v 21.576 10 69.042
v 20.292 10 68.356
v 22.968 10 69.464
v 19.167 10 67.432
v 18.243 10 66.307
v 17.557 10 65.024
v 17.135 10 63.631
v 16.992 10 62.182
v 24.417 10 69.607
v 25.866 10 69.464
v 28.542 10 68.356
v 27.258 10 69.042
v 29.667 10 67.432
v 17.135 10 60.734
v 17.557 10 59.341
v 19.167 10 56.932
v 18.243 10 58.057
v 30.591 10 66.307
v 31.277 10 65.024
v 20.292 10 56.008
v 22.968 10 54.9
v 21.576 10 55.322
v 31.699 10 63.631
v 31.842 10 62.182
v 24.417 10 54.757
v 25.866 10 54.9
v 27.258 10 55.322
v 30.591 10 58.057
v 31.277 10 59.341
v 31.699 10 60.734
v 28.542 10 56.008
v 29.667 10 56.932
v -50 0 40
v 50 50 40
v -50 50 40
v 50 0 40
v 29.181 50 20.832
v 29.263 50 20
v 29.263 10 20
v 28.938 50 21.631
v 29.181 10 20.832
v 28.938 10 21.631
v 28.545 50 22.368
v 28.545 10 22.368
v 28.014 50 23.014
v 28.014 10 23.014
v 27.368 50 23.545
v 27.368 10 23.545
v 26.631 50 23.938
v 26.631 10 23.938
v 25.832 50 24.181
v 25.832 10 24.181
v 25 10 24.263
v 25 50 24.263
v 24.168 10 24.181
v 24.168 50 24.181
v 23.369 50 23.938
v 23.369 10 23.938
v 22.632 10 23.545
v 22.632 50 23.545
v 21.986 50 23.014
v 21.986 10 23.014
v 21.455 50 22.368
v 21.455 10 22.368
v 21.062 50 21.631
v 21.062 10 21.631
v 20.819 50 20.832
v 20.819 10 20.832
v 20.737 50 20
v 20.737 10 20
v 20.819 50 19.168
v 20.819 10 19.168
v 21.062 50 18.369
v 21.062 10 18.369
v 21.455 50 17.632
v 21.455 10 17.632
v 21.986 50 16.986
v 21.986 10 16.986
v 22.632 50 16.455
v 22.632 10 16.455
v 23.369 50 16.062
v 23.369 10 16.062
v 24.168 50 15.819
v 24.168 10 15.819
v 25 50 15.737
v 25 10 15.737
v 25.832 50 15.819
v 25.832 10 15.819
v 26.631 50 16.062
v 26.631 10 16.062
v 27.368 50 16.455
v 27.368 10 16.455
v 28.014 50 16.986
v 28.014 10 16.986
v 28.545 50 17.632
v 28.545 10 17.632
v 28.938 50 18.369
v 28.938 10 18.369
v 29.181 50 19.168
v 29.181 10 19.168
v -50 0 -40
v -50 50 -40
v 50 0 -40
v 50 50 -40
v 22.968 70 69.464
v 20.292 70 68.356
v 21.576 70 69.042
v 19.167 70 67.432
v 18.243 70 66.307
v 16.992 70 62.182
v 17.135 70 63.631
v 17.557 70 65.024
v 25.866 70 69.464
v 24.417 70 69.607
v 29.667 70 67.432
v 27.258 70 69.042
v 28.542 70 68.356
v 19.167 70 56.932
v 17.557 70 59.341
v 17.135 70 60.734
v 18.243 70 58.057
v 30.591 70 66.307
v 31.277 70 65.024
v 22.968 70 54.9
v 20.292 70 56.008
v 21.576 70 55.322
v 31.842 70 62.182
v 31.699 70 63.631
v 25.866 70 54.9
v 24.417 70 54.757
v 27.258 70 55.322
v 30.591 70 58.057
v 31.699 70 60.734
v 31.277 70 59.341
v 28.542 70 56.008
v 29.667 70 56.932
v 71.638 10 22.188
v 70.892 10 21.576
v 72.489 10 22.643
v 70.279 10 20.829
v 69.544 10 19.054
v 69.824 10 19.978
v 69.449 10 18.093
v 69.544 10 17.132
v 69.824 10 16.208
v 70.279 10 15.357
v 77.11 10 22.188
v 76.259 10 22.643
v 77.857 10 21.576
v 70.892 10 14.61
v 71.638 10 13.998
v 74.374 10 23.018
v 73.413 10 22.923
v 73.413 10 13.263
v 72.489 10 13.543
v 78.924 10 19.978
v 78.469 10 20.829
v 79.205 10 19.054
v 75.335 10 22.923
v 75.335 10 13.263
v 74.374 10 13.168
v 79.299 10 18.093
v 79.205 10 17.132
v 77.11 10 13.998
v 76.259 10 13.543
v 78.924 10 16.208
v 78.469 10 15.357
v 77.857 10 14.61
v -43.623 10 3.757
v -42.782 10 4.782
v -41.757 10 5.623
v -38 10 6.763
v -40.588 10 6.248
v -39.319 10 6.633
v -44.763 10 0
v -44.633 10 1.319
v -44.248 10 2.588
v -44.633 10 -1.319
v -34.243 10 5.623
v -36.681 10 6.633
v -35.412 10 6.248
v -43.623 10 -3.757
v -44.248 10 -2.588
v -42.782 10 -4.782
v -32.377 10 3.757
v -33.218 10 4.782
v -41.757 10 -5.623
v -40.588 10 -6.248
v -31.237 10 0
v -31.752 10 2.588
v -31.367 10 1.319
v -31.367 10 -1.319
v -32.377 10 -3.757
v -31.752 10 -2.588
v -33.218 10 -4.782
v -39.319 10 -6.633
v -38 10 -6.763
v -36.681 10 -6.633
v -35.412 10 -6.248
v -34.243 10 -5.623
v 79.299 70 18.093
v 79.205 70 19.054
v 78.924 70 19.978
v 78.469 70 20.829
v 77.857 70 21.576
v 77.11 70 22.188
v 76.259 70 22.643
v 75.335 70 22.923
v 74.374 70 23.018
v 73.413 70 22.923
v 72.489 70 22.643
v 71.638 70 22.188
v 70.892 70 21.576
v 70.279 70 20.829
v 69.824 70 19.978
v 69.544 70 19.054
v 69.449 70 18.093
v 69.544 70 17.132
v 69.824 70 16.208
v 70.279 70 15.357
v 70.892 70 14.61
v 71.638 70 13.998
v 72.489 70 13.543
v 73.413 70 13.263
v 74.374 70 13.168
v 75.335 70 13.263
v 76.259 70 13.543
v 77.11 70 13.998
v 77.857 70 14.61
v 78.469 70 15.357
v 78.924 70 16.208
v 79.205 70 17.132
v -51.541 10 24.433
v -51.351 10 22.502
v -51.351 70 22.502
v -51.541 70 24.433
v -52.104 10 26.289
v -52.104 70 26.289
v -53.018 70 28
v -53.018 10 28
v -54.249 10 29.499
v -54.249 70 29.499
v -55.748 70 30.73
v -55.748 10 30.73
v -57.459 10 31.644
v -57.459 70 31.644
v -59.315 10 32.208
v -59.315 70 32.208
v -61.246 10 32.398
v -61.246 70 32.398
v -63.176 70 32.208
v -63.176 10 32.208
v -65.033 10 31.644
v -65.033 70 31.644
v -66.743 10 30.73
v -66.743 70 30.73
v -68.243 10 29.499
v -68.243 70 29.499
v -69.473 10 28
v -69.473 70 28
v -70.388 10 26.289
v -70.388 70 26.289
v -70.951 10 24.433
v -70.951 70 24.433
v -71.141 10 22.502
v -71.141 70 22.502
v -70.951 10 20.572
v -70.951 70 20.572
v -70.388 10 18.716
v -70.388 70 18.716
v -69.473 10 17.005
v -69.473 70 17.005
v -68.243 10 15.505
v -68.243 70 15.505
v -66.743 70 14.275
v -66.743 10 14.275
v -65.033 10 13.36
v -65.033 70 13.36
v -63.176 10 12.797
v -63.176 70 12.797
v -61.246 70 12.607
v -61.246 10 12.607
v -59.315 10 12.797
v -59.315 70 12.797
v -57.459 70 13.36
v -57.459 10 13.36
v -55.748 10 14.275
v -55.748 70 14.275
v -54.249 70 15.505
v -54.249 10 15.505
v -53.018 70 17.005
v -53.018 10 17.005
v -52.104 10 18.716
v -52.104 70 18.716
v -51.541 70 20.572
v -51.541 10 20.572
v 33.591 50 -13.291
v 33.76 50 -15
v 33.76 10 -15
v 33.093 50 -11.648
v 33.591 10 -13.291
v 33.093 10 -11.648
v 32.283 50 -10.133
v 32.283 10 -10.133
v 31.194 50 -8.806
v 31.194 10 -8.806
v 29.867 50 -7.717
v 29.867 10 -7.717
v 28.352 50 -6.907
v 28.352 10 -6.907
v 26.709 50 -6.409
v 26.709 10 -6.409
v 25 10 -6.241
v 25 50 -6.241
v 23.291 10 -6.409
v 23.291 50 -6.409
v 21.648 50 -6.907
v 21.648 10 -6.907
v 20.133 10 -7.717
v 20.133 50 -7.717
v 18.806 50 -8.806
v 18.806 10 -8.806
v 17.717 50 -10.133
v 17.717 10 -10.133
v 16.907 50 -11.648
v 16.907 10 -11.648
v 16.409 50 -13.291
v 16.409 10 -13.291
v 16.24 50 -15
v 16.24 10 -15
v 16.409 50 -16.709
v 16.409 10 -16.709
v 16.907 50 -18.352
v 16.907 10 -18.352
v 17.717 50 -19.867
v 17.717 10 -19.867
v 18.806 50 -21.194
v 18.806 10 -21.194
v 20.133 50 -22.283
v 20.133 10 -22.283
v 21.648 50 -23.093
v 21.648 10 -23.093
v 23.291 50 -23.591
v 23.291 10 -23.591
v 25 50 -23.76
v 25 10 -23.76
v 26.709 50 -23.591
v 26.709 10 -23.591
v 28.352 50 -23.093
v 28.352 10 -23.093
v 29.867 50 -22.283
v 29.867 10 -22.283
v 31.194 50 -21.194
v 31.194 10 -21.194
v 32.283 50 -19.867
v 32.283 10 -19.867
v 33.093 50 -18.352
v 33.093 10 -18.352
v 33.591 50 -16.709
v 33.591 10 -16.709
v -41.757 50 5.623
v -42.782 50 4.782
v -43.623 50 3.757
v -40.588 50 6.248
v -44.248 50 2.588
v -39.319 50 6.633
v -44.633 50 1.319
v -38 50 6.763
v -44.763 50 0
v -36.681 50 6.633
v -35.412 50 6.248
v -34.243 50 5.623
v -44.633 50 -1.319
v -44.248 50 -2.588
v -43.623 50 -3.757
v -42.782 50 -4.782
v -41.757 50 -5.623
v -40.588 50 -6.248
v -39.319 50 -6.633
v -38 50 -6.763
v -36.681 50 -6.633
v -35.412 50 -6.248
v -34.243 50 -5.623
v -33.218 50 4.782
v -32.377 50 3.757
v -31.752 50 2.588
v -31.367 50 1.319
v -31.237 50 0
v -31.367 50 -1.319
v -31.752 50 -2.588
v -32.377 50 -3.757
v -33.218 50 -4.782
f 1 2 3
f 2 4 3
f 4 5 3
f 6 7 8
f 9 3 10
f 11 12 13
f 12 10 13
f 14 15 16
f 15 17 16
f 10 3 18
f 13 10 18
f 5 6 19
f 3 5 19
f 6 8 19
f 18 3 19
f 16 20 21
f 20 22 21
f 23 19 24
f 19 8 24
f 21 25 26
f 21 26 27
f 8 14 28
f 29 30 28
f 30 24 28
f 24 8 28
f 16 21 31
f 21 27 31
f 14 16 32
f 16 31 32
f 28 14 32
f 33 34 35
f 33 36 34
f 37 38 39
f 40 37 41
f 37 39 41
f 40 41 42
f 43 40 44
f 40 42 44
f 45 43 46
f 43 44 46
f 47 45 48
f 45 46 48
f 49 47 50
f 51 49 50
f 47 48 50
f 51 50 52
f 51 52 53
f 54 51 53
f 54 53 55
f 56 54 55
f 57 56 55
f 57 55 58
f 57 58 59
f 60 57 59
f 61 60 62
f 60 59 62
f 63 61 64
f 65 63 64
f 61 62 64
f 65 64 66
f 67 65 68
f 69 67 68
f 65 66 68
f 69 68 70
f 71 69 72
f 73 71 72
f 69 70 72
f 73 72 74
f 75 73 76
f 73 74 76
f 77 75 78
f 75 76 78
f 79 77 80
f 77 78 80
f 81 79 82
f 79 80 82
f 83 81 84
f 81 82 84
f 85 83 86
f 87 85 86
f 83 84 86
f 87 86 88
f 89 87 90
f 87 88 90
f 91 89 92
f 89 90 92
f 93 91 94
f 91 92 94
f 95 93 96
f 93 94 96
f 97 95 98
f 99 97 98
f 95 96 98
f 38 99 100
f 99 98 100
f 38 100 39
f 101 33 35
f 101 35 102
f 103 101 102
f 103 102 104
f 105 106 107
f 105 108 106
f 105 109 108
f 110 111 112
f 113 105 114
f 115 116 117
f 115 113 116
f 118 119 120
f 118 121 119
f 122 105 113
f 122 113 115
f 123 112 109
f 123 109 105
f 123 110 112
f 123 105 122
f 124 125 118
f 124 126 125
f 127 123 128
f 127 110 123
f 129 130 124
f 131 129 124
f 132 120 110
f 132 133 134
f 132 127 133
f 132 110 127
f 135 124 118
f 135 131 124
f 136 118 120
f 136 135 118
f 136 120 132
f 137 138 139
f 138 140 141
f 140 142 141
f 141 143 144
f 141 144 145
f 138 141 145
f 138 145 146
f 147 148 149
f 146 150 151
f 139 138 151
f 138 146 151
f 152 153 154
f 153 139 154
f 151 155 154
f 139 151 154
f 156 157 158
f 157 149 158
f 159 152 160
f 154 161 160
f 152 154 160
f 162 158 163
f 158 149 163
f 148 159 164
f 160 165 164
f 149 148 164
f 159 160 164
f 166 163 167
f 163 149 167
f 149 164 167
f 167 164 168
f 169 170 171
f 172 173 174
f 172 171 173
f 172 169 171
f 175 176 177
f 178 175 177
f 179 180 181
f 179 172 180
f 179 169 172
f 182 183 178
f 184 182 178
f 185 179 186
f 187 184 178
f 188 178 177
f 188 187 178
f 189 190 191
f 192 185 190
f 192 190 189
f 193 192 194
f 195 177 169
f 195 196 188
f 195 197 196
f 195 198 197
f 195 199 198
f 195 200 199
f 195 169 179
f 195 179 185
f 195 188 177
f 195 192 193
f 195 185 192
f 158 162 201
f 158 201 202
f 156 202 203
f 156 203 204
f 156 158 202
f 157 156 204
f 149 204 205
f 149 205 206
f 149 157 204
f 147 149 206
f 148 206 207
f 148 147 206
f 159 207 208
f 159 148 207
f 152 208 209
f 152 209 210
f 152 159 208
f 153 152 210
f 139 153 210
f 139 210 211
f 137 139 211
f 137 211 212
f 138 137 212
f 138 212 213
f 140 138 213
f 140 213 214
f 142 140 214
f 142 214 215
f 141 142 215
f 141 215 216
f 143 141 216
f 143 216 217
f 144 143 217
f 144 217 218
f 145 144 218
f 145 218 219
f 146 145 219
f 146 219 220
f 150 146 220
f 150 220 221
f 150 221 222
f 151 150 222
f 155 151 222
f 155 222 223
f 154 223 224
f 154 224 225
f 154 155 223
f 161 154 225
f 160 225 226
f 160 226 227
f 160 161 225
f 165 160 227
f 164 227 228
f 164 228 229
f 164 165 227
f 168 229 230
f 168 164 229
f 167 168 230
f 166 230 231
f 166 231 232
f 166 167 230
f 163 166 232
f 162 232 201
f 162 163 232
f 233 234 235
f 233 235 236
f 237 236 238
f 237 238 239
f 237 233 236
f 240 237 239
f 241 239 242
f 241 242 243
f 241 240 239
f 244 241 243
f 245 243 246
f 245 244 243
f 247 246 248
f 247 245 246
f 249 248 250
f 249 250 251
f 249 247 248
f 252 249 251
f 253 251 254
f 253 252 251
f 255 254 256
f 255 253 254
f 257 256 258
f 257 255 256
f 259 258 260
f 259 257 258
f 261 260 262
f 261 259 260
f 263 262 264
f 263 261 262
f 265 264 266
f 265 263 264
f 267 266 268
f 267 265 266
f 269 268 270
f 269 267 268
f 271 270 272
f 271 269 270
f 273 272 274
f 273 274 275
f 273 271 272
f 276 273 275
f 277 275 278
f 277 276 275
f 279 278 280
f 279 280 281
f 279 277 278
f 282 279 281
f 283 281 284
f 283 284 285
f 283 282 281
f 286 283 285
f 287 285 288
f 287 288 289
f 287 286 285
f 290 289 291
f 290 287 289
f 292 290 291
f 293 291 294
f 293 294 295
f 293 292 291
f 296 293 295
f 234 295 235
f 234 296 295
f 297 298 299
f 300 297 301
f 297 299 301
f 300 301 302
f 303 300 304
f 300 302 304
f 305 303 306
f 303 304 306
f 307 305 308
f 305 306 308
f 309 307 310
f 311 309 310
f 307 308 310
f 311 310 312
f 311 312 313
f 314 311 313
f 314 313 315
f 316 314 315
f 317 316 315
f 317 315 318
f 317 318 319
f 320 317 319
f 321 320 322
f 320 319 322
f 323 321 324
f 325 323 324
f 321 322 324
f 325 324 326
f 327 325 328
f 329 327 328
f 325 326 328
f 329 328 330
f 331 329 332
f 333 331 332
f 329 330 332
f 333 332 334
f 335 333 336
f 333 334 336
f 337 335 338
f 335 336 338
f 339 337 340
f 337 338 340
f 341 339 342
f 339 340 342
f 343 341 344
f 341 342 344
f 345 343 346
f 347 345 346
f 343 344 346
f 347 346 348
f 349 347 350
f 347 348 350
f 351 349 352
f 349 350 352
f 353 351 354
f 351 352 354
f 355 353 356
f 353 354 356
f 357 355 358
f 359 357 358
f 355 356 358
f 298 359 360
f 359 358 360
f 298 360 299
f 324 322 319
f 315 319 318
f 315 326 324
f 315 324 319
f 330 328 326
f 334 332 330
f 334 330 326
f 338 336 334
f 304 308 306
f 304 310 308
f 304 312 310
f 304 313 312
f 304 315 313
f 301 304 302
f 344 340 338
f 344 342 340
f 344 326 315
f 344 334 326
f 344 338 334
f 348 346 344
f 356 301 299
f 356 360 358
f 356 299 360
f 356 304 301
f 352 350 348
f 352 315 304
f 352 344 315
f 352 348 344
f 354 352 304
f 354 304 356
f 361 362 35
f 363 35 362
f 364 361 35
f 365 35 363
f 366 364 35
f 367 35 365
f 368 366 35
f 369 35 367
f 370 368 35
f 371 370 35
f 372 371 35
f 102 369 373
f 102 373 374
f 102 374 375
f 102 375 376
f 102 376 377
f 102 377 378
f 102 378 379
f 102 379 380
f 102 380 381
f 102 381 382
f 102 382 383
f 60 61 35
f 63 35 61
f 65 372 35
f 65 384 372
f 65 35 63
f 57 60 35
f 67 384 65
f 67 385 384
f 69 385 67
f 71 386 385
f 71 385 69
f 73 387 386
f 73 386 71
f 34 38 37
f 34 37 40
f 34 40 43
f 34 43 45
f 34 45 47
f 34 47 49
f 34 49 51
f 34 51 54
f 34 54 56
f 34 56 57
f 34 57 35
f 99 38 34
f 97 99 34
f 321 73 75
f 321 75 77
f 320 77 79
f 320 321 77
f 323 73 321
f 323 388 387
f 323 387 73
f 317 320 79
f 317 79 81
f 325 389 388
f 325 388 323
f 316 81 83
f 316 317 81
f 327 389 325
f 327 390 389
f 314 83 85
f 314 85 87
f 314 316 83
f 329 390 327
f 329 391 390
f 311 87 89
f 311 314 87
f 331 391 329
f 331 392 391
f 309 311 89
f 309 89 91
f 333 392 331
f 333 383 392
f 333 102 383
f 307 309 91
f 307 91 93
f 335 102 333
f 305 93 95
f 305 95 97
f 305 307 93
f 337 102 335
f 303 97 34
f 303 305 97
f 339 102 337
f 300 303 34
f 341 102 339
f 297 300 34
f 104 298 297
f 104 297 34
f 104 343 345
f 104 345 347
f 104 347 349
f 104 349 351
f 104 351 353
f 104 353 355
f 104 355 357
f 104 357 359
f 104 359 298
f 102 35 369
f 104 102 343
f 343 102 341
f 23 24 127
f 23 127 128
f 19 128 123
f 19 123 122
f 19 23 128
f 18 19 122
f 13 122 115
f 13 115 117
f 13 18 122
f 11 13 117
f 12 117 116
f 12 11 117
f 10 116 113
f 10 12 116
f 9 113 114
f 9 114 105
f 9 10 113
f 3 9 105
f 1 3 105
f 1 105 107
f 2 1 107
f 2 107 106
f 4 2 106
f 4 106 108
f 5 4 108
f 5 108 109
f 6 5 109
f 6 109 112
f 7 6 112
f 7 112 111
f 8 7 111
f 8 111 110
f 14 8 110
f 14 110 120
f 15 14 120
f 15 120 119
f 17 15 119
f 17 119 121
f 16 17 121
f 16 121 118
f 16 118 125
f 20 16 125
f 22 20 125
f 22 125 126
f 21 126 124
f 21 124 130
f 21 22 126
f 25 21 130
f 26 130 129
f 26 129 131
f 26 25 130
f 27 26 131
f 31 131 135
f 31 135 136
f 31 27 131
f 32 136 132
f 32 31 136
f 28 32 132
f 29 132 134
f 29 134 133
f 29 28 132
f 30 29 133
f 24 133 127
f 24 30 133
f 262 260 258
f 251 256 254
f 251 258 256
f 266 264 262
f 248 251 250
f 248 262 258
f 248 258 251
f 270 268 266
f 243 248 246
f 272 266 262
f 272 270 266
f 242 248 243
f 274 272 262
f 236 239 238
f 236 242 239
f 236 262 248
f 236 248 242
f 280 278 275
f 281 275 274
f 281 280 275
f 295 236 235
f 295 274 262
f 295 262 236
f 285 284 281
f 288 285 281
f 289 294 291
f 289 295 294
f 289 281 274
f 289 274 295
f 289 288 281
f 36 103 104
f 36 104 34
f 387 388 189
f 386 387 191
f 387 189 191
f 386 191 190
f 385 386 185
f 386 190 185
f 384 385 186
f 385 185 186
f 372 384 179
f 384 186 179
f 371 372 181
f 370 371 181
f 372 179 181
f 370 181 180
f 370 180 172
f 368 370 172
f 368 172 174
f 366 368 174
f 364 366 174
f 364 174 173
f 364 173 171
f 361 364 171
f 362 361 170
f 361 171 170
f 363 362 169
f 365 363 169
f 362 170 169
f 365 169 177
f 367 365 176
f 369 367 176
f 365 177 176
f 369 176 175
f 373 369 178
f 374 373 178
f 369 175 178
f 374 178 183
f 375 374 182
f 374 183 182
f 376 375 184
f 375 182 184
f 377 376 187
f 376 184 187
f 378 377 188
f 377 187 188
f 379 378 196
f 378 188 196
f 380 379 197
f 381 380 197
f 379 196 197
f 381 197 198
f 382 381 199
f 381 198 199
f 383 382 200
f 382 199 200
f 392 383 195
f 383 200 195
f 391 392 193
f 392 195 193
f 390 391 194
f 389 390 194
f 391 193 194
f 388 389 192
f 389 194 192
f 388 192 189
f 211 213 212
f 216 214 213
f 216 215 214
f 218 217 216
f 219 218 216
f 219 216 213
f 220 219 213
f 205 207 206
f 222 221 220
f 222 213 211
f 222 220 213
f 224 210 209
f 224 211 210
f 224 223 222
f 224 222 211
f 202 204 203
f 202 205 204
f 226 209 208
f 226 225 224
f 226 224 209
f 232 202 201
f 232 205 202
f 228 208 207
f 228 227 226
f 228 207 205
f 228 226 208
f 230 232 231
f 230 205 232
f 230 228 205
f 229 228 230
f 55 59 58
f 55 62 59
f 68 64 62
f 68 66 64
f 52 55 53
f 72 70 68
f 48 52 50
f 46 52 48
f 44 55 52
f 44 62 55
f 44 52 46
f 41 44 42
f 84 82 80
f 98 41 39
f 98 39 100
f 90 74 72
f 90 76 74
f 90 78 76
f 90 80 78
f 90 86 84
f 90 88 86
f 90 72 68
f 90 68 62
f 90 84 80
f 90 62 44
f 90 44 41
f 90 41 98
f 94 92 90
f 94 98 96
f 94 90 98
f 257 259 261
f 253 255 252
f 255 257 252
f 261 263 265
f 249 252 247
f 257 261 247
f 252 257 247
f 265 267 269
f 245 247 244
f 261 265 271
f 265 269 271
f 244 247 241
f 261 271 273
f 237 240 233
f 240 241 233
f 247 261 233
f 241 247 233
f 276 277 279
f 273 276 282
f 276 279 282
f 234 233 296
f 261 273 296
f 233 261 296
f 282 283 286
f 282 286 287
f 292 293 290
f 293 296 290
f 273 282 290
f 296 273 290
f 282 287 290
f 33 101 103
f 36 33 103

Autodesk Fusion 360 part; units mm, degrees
sketch "Sketch1" plane through (0, 0, 0) normal (0, 1, 0) x (1, 0, 0)
  line L0 (50, -40) -> (-50, -40)
  line L1 (-50, -40) -> (-50, 40)
  line L2 (-50, 40) -> (50, 40)
  line L3 (50, 40) -> (50, -40)
  line L4 (50, -40) -> (-50, 40) construction
  line L5 (-50, -40) -> (50, 40) construction
  dimension "d1" = 80
  dimension "d2" = 100
extrude "Extrude1" add sketch "Sketch1" along normal blind 50 makes body 1
ref_plane "WorkPlane1" through (0, 10, 0) normal (0, 1, 0) x (0, 0, 1)
sketch "Hole" plane through (0, 10, 0) normal (0, 1, 0) x (1, 0, 0)
  circle A0 centre (25, -20) radius 5
  circle A1 centre (-38, 0) radius 7.5
  circle A2 centre (25, 15) radius 10
  line L0 (-50, 40) -> (50, 40)
  line L1 (50, 40) -> (50, -40)
  line L2 (50, -40) -> (-50, -40)
  line L3 (-50, -40) -> (-50, 40)
  line L4 (50, -40) -> (-50, 40)
  dimension "d6" = 10
  dimension "d7" = 15
  dimension "d8" = 20
  dimension "d30" = 25
  dimension "d31" = 25
  dimension "d32" = 20
  dimension "d33" = 12
extrude "Extrude5" cut sketch "Hole" along normal blind 60 contours A2 bodies 1
extrude "Extrude6" cut sketch "Hole" along normal blind 60 contours A0 L4 | A0 L4 bodies 1
extrude "Extrude7" cut sketch "Hole" along normal blind 60 contours A1 bodies 1
sketch "Rod" plane through (0, 10, 0) normal (0, 1, 0) x (1, 0, 0)
  circle A0 centre (74.3742, -18.093) radius 5
  circle A1 centre (24.417, -62.1821) radius 7.5
  circle A2 centre (-61.2458, -22.5024) radius 10
  dimension "d21" = 10
  dimension "d22" = 15
  dimension "d23" = 20
extrude "Extrude8" add sketch "Rod" along normal blind 60 separate body contours A0 makes body 2
extrude "Extrude9" add sketch "Rod" along normal blind 60 separate body contours A1 makes body 3
extrude "Extrude10" add sketch "Rod" along normal blind 60 separate body contours A2 makes body 4
copy_body "Body->Comp1" bodies 1 removing the originals makes body 5 in component "Block"
copy_body "Body->Comp2" bodies 2 removing the originals makes body 6 in component "Rod 1"
copy_body "Body->Comp3" bodies 3 removing the originals makes body 7 in component "Rod 2"
copy_body "Body->Comp4" bodies 4 removing the originals makes body 8 in component "Rod 3"
thread "Thread1" "ISO Metric profile 15.0 M15x1.5 6H" major diameter 15.2033 minor diameter 13.5262 pitch 1.5 angle 60 resizes the face on face at (-30.5373, 36.6667, -0.7468) on bodies 5 in component "Block"
thread "Thread2" "ISO Metric profile 20.0 M20x2.5 6H" major diameter 20.2925 minor diameter 17.519 pitch 2.5 angle 60 resizes the face on face at (34.9876, 23.3333, -15.4985) on bodies 5 in component "Block"
thread "Thread3" "ISO Metric profile 10.0 M10x1.5 6H" major diameter 10.198 minor diameter 8.526 pitch 1.5 angle 60 resizes the face on face at (29.9938, 23.3333, 19.7508) on bodies 5 in component "Block"
thread "Thread1'" "ISO Metric profile 10.0 M10x1.5 6g" major diameter 9.85 minor diameter 8.141 pitch 1.5 angle 60 resizes the face on face at (79.3494, 50, 18.5909) on bodies 6 in component "Rod 1"
thread "Thread1''" "ISO Metric profile 15.0 M15x1.5 6g" major diameter 14.85 minor diameter 13.1369 pitch 1.5 angle 60 resizes the face on face at (31.8798, 50, 62.9289) on bodies 7 in component "Rod 2"
thread "Thread1'''" "ISO Metric profile 20.0 M20x2.5 6g" major diameter 19.7905 minor diameter 16.938 pitch 2.5 angle 60 resizes the face on face at (-51.2955, 50, 23.4981) on bodies 8 in component "Rod 3"
component "Block" placed x (1, 0, 0) y (0, 1, 0) z (0, 0, 1) at (0, 0, 0)
component "Rod 1" placed x (1, 0, 0) y (0, 1, 0) z (0, 0, 1) at (0, 0, 0)
component "Rod 2" placed x (1, 0, 0) y (0, 1, 0) z (0, 0, 1) at (0, 0, 0)
component "Rod 3" placed x (1, 0, 0) y (0, 1, 0) z (0, 0, 1) at (0, 0, 0)
